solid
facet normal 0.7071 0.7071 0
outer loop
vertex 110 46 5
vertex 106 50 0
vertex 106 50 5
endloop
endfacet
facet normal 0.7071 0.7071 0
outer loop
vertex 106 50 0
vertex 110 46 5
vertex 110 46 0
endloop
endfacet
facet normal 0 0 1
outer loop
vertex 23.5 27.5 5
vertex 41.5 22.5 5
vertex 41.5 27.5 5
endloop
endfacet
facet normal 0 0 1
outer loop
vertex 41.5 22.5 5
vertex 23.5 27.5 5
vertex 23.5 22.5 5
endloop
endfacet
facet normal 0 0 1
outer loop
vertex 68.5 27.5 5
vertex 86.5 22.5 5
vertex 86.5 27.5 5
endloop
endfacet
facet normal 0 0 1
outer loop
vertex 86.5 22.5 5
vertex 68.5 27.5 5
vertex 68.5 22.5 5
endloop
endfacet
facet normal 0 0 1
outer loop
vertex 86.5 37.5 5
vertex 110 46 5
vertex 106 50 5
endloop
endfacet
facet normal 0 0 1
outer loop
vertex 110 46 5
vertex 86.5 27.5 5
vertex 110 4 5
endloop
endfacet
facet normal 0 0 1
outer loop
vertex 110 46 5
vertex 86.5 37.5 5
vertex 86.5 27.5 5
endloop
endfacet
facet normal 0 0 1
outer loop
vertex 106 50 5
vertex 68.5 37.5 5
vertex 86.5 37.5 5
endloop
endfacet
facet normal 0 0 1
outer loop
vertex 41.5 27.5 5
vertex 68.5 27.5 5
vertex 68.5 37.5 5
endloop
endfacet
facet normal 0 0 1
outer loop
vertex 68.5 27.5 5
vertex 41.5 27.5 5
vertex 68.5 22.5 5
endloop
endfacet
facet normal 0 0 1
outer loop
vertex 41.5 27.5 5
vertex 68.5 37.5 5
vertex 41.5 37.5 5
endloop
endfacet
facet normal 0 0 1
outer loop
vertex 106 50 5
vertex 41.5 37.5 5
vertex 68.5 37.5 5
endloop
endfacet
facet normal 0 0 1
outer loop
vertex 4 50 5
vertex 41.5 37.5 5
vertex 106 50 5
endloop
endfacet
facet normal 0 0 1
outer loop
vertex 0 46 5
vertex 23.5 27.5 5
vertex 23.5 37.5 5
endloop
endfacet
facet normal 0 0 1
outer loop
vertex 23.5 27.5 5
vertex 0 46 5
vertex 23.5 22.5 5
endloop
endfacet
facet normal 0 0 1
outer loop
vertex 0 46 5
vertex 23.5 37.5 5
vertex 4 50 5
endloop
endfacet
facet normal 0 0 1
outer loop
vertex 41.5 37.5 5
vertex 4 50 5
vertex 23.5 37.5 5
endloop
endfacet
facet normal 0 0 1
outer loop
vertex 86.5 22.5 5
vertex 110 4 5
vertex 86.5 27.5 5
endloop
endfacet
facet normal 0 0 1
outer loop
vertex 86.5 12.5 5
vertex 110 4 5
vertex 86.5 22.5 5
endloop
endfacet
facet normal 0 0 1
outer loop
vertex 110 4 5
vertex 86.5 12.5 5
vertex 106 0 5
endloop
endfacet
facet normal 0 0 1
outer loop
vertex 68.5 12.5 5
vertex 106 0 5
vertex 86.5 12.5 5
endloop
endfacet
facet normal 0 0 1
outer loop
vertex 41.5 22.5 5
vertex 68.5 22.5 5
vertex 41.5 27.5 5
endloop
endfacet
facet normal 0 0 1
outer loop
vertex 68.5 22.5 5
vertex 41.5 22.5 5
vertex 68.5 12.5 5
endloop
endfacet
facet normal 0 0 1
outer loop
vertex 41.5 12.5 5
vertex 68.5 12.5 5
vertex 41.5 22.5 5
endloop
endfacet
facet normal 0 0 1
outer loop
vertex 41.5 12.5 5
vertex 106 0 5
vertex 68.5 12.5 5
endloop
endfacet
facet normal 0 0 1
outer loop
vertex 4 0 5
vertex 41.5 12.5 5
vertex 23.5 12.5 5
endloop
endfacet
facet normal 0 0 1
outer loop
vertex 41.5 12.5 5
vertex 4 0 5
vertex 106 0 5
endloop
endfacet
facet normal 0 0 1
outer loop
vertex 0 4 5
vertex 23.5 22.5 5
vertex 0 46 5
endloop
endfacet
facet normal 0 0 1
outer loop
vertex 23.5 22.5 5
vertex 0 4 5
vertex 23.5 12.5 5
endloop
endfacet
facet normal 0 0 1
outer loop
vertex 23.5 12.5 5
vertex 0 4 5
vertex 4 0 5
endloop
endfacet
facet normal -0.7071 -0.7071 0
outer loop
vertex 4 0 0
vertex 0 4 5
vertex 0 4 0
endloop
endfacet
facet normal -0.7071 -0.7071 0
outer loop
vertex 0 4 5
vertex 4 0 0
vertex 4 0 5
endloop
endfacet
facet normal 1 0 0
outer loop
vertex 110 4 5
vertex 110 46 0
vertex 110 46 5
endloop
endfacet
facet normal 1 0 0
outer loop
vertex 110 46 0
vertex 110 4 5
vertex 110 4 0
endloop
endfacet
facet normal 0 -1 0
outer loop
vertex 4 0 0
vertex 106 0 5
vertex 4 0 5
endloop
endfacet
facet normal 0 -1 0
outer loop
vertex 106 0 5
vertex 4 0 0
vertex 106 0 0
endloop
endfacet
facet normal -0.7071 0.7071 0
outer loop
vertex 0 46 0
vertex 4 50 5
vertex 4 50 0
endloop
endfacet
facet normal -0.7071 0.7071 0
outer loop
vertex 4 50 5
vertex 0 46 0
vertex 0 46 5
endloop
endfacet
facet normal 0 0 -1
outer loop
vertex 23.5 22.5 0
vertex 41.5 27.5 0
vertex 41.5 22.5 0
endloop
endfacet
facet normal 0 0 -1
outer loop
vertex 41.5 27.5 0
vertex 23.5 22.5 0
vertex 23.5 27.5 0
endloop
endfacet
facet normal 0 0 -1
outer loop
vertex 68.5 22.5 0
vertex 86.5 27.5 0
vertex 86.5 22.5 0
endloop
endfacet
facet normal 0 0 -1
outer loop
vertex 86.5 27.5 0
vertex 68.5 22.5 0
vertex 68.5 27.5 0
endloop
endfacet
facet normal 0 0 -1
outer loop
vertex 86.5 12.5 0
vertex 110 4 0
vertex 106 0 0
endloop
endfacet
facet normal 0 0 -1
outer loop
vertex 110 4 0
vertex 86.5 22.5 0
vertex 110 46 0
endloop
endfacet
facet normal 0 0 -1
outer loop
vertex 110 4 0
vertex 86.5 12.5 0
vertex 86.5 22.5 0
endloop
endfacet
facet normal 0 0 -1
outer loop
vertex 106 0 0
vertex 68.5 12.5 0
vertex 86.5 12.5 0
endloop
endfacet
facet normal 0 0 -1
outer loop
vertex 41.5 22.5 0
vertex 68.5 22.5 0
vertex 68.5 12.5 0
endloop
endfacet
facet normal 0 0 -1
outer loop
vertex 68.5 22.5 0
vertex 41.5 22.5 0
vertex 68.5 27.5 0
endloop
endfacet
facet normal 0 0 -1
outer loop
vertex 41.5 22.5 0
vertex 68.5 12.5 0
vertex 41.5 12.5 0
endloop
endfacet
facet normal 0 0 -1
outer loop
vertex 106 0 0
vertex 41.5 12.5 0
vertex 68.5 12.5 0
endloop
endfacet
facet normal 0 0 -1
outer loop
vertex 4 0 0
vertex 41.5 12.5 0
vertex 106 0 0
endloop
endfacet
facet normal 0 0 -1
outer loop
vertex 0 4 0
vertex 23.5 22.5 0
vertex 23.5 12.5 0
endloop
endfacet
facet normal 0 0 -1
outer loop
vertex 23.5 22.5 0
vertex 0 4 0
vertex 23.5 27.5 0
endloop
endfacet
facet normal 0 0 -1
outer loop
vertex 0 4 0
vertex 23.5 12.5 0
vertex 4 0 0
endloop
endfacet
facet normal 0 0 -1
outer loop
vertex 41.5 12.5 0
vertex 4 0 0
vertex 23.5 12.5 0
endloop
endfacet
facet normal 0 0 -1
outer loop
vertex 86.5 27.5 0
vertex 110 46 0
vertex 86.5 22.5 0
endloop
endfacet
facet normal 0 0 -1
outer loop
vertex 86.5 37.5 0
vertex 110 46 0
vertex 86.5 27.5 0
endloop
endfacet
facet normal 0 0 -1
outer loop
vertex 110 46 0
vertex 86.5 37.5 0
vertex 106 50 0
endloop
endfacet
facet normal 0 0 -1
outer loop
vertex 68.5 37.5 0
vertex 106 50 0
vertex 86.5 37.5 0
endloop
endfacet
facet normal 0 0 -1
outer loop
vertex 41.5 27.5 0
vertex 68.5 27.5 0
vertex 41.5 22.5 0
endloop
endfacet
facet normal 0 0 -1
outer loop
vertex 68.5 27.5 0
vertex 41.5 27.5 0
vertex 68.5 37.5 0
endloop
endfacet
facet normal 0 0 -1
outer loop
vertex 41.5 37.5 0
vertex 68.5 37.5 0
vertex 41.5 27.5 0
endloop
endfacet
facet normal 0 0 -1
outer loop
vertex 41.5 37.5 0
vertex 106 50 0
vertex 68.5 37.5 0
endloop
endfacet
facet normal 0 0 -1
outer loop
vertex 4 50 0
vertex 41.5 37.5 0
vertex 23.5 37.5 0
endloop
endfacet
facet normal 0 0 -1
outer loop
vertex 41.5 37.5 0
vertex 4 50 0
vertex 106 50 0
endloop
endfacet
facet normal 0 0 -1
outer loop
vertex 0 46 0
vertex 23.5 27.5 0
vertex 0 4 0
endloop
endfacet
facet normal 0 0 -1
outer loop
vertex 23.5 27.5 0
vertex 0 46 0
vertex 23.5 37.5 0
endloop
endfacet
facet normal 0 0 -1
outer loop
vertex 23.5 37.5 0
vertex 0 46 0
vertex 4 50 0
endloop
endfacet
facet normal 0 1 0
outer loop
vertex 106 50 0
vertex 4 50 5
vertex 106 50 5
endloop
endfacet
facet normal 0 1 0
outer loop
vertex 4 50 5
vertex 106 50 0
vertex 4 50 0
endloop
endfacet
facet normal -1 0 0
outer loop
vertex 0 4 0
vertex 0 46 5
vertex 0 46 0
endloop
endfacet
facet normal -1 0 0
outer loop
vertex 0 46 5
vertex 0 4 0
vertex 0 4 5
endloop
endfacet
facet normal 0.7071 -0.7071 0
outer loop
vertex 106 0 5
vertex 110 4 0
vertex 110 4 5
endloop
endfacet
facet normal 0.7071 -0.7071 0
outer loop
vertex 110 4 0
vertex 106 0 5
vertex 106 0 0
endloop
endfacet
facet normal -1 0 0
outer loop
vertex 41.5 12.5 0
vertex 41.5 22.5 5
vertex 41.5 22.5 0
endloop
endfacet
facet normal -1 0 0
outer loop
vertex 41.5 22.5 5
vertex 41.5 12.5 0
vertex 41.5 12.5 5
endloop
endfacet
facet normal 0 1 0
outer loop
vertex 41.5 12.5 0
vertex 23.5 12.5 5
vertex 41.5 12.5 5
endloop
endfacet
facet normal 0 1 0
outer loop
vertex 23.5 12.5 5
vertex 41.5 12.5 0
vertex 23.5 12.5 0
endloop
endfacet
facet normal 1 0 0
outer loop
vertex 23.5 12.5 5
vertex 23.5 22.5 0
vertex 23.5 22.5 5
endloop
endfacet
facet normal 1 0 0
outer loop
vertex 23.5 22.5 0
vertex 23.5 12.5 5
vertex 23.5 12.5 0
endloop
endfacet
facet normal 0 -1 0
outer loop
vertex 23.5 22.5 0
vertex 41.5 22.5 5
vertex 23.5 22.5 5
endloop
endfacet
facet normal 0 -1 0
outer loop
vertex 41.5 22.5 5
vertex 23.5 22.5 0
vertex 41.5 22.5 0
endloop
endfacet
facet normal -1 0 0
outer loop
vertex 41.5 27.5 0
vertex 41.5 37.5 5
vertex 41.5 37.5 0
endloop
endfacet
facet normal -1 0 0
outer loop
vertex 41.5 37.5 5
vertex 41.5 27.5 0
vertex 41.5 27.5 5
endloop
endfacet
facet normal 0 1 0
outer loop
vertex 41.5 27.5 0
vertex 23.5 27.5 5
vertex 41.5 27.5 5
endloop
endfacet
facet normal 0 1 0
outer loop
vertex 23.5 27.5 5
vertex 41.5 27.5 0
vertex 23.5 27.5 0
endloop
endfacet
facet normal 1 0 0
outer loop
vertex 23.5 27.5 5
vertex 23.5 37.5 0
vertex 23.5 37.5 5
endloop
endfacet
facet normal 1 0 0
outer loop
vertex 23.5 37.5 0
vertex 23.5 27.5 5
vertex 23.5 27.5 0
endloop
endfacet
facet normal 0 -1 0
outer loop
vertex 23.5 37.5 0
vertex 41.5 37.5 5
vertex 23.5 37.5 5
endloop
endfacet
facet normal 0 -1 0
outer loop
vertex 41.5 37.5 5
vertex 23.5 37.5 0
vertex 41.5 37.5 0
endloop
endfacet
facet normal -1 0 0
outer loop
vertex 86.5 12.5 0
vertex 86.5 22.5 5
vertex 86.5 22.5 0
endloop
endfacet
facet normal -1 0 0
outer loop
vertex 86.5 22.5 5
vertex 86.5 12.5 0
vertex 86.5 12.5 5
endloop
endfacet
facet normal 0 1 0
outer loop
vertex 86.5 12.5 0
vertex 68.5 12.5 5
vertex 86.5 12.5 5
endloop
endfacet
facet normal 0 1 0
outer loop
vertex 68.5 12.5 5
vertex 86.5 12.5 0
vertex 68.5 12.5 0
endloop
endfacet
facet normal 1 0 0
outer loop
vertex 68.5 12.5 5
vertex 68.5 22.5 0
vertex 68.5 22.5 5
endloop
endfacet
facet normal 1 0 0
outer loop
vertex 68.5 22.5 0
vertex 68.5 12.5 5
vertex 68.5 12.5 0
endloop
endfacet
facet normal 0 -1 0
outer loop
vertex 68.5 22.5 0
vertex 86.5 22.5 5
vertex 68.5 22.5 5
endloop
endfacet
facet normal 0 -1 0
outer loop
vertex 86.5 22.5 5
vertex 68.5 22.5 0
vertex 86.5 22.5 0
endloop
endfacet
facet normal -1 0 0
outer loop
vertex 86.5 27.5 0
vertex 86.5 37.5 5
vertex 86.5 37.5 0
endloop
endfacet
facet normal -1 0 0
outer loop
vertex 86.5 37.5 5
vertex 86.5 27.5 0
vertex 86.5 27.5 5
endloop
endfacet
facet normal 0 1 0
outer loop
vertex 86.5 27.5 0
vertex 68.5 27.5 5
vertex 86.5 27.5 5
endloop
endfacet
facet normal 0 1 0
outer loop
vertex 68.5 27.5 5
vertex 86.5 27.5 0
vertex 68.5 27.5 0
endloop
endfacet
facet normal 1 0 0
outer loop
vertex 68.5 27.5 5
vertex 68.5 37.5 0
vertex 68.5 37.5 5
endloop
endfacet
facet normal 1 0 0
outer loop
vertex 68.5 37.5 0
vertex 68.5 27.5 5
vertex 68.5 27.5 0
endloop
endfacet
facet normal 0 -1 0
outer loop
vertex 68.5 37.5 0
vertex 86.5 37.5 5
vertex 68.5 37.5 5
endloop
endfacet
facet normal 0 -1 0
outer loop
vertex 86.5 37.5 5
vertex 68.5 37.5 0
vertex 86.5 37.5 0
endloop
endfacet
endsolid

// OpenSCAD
$fn = 32;

// ----------------------------------------------------------------------
// Windowed plate: 4 voids, 110 x 50 x 5 mm
// ----------------------------------------------------------------------

// --- parameters (mm) ---
plate_l = 110;            // plate length, X
plate_w = 50;             // plate width, Y
plate_t = 5;              // plate thickness, Z
edge_margin = 10;         // wall from the plate edge to any window
win_l = 18;               // pocket length
win_w = 10;               // pocket width
pitch_x = 45;             // grid pitch along X
pitch_y = 15;             // grid pitch along Y
depth_1 = 5;              // depth of void 1 (full thickness = through)
depth_2 = 5;              // depth of void 2 (full thickness = through)
depth_3 = 5;              // depth of void 3 (full thickness = through)
depth_4 = 5;              // depth of void 4 (full thickness = through)
corner_c = 4;             // corner chamfer of the plate

profile = [[4, 0], [106, 0], [110, 4], [110, 46], [106, 50], [4, 50], [0, 46], [0, 4]];  // primary outline, 8 points, counter clockwise
void_1 = [[23.5, 12.5], [41.5, 12.5], [41.5, 22.5], [23.5, 22.5]];  // pocket at grid node 0,0, 4 points
void_2 = [[23.5, 27.5], [41.5, 27.5], [41.5, 37.5], [23.5, 37.5]];  // pocket at grid node 0,1, 4 points
void_3 = [[68.5, 12.5], [86.5, 12.5], [86.5, 22.5], [68.5, 22.5]];  // pocket at grid node 1,0, 4 points
void_4 = [[68.5, 27.5], [86.5, 27.5], [86.5, 37.5], [68.5, 37.5]];  // pocket at grid node 1,1, 4 points

// --- the one profile operation ---
difference() {
  linear_extrude(height = plate_t) polygon(points = profile);
  translate([0, 0, -1])
    linear_extrude(height = plate_t + 2) polygon(points = void_1);
  translate([0, 0, -1])
    linear_extrude(height = plate_t + 2) polygon(points = void_2);
  translate([0, 0, -1])
    linear_extrude(height = plate_t + 2) polygon(points = void_3);
  translate([0, 0, -1])
    linear_extrude(height = plate_t + 2) polygon(points = void_4);
}
